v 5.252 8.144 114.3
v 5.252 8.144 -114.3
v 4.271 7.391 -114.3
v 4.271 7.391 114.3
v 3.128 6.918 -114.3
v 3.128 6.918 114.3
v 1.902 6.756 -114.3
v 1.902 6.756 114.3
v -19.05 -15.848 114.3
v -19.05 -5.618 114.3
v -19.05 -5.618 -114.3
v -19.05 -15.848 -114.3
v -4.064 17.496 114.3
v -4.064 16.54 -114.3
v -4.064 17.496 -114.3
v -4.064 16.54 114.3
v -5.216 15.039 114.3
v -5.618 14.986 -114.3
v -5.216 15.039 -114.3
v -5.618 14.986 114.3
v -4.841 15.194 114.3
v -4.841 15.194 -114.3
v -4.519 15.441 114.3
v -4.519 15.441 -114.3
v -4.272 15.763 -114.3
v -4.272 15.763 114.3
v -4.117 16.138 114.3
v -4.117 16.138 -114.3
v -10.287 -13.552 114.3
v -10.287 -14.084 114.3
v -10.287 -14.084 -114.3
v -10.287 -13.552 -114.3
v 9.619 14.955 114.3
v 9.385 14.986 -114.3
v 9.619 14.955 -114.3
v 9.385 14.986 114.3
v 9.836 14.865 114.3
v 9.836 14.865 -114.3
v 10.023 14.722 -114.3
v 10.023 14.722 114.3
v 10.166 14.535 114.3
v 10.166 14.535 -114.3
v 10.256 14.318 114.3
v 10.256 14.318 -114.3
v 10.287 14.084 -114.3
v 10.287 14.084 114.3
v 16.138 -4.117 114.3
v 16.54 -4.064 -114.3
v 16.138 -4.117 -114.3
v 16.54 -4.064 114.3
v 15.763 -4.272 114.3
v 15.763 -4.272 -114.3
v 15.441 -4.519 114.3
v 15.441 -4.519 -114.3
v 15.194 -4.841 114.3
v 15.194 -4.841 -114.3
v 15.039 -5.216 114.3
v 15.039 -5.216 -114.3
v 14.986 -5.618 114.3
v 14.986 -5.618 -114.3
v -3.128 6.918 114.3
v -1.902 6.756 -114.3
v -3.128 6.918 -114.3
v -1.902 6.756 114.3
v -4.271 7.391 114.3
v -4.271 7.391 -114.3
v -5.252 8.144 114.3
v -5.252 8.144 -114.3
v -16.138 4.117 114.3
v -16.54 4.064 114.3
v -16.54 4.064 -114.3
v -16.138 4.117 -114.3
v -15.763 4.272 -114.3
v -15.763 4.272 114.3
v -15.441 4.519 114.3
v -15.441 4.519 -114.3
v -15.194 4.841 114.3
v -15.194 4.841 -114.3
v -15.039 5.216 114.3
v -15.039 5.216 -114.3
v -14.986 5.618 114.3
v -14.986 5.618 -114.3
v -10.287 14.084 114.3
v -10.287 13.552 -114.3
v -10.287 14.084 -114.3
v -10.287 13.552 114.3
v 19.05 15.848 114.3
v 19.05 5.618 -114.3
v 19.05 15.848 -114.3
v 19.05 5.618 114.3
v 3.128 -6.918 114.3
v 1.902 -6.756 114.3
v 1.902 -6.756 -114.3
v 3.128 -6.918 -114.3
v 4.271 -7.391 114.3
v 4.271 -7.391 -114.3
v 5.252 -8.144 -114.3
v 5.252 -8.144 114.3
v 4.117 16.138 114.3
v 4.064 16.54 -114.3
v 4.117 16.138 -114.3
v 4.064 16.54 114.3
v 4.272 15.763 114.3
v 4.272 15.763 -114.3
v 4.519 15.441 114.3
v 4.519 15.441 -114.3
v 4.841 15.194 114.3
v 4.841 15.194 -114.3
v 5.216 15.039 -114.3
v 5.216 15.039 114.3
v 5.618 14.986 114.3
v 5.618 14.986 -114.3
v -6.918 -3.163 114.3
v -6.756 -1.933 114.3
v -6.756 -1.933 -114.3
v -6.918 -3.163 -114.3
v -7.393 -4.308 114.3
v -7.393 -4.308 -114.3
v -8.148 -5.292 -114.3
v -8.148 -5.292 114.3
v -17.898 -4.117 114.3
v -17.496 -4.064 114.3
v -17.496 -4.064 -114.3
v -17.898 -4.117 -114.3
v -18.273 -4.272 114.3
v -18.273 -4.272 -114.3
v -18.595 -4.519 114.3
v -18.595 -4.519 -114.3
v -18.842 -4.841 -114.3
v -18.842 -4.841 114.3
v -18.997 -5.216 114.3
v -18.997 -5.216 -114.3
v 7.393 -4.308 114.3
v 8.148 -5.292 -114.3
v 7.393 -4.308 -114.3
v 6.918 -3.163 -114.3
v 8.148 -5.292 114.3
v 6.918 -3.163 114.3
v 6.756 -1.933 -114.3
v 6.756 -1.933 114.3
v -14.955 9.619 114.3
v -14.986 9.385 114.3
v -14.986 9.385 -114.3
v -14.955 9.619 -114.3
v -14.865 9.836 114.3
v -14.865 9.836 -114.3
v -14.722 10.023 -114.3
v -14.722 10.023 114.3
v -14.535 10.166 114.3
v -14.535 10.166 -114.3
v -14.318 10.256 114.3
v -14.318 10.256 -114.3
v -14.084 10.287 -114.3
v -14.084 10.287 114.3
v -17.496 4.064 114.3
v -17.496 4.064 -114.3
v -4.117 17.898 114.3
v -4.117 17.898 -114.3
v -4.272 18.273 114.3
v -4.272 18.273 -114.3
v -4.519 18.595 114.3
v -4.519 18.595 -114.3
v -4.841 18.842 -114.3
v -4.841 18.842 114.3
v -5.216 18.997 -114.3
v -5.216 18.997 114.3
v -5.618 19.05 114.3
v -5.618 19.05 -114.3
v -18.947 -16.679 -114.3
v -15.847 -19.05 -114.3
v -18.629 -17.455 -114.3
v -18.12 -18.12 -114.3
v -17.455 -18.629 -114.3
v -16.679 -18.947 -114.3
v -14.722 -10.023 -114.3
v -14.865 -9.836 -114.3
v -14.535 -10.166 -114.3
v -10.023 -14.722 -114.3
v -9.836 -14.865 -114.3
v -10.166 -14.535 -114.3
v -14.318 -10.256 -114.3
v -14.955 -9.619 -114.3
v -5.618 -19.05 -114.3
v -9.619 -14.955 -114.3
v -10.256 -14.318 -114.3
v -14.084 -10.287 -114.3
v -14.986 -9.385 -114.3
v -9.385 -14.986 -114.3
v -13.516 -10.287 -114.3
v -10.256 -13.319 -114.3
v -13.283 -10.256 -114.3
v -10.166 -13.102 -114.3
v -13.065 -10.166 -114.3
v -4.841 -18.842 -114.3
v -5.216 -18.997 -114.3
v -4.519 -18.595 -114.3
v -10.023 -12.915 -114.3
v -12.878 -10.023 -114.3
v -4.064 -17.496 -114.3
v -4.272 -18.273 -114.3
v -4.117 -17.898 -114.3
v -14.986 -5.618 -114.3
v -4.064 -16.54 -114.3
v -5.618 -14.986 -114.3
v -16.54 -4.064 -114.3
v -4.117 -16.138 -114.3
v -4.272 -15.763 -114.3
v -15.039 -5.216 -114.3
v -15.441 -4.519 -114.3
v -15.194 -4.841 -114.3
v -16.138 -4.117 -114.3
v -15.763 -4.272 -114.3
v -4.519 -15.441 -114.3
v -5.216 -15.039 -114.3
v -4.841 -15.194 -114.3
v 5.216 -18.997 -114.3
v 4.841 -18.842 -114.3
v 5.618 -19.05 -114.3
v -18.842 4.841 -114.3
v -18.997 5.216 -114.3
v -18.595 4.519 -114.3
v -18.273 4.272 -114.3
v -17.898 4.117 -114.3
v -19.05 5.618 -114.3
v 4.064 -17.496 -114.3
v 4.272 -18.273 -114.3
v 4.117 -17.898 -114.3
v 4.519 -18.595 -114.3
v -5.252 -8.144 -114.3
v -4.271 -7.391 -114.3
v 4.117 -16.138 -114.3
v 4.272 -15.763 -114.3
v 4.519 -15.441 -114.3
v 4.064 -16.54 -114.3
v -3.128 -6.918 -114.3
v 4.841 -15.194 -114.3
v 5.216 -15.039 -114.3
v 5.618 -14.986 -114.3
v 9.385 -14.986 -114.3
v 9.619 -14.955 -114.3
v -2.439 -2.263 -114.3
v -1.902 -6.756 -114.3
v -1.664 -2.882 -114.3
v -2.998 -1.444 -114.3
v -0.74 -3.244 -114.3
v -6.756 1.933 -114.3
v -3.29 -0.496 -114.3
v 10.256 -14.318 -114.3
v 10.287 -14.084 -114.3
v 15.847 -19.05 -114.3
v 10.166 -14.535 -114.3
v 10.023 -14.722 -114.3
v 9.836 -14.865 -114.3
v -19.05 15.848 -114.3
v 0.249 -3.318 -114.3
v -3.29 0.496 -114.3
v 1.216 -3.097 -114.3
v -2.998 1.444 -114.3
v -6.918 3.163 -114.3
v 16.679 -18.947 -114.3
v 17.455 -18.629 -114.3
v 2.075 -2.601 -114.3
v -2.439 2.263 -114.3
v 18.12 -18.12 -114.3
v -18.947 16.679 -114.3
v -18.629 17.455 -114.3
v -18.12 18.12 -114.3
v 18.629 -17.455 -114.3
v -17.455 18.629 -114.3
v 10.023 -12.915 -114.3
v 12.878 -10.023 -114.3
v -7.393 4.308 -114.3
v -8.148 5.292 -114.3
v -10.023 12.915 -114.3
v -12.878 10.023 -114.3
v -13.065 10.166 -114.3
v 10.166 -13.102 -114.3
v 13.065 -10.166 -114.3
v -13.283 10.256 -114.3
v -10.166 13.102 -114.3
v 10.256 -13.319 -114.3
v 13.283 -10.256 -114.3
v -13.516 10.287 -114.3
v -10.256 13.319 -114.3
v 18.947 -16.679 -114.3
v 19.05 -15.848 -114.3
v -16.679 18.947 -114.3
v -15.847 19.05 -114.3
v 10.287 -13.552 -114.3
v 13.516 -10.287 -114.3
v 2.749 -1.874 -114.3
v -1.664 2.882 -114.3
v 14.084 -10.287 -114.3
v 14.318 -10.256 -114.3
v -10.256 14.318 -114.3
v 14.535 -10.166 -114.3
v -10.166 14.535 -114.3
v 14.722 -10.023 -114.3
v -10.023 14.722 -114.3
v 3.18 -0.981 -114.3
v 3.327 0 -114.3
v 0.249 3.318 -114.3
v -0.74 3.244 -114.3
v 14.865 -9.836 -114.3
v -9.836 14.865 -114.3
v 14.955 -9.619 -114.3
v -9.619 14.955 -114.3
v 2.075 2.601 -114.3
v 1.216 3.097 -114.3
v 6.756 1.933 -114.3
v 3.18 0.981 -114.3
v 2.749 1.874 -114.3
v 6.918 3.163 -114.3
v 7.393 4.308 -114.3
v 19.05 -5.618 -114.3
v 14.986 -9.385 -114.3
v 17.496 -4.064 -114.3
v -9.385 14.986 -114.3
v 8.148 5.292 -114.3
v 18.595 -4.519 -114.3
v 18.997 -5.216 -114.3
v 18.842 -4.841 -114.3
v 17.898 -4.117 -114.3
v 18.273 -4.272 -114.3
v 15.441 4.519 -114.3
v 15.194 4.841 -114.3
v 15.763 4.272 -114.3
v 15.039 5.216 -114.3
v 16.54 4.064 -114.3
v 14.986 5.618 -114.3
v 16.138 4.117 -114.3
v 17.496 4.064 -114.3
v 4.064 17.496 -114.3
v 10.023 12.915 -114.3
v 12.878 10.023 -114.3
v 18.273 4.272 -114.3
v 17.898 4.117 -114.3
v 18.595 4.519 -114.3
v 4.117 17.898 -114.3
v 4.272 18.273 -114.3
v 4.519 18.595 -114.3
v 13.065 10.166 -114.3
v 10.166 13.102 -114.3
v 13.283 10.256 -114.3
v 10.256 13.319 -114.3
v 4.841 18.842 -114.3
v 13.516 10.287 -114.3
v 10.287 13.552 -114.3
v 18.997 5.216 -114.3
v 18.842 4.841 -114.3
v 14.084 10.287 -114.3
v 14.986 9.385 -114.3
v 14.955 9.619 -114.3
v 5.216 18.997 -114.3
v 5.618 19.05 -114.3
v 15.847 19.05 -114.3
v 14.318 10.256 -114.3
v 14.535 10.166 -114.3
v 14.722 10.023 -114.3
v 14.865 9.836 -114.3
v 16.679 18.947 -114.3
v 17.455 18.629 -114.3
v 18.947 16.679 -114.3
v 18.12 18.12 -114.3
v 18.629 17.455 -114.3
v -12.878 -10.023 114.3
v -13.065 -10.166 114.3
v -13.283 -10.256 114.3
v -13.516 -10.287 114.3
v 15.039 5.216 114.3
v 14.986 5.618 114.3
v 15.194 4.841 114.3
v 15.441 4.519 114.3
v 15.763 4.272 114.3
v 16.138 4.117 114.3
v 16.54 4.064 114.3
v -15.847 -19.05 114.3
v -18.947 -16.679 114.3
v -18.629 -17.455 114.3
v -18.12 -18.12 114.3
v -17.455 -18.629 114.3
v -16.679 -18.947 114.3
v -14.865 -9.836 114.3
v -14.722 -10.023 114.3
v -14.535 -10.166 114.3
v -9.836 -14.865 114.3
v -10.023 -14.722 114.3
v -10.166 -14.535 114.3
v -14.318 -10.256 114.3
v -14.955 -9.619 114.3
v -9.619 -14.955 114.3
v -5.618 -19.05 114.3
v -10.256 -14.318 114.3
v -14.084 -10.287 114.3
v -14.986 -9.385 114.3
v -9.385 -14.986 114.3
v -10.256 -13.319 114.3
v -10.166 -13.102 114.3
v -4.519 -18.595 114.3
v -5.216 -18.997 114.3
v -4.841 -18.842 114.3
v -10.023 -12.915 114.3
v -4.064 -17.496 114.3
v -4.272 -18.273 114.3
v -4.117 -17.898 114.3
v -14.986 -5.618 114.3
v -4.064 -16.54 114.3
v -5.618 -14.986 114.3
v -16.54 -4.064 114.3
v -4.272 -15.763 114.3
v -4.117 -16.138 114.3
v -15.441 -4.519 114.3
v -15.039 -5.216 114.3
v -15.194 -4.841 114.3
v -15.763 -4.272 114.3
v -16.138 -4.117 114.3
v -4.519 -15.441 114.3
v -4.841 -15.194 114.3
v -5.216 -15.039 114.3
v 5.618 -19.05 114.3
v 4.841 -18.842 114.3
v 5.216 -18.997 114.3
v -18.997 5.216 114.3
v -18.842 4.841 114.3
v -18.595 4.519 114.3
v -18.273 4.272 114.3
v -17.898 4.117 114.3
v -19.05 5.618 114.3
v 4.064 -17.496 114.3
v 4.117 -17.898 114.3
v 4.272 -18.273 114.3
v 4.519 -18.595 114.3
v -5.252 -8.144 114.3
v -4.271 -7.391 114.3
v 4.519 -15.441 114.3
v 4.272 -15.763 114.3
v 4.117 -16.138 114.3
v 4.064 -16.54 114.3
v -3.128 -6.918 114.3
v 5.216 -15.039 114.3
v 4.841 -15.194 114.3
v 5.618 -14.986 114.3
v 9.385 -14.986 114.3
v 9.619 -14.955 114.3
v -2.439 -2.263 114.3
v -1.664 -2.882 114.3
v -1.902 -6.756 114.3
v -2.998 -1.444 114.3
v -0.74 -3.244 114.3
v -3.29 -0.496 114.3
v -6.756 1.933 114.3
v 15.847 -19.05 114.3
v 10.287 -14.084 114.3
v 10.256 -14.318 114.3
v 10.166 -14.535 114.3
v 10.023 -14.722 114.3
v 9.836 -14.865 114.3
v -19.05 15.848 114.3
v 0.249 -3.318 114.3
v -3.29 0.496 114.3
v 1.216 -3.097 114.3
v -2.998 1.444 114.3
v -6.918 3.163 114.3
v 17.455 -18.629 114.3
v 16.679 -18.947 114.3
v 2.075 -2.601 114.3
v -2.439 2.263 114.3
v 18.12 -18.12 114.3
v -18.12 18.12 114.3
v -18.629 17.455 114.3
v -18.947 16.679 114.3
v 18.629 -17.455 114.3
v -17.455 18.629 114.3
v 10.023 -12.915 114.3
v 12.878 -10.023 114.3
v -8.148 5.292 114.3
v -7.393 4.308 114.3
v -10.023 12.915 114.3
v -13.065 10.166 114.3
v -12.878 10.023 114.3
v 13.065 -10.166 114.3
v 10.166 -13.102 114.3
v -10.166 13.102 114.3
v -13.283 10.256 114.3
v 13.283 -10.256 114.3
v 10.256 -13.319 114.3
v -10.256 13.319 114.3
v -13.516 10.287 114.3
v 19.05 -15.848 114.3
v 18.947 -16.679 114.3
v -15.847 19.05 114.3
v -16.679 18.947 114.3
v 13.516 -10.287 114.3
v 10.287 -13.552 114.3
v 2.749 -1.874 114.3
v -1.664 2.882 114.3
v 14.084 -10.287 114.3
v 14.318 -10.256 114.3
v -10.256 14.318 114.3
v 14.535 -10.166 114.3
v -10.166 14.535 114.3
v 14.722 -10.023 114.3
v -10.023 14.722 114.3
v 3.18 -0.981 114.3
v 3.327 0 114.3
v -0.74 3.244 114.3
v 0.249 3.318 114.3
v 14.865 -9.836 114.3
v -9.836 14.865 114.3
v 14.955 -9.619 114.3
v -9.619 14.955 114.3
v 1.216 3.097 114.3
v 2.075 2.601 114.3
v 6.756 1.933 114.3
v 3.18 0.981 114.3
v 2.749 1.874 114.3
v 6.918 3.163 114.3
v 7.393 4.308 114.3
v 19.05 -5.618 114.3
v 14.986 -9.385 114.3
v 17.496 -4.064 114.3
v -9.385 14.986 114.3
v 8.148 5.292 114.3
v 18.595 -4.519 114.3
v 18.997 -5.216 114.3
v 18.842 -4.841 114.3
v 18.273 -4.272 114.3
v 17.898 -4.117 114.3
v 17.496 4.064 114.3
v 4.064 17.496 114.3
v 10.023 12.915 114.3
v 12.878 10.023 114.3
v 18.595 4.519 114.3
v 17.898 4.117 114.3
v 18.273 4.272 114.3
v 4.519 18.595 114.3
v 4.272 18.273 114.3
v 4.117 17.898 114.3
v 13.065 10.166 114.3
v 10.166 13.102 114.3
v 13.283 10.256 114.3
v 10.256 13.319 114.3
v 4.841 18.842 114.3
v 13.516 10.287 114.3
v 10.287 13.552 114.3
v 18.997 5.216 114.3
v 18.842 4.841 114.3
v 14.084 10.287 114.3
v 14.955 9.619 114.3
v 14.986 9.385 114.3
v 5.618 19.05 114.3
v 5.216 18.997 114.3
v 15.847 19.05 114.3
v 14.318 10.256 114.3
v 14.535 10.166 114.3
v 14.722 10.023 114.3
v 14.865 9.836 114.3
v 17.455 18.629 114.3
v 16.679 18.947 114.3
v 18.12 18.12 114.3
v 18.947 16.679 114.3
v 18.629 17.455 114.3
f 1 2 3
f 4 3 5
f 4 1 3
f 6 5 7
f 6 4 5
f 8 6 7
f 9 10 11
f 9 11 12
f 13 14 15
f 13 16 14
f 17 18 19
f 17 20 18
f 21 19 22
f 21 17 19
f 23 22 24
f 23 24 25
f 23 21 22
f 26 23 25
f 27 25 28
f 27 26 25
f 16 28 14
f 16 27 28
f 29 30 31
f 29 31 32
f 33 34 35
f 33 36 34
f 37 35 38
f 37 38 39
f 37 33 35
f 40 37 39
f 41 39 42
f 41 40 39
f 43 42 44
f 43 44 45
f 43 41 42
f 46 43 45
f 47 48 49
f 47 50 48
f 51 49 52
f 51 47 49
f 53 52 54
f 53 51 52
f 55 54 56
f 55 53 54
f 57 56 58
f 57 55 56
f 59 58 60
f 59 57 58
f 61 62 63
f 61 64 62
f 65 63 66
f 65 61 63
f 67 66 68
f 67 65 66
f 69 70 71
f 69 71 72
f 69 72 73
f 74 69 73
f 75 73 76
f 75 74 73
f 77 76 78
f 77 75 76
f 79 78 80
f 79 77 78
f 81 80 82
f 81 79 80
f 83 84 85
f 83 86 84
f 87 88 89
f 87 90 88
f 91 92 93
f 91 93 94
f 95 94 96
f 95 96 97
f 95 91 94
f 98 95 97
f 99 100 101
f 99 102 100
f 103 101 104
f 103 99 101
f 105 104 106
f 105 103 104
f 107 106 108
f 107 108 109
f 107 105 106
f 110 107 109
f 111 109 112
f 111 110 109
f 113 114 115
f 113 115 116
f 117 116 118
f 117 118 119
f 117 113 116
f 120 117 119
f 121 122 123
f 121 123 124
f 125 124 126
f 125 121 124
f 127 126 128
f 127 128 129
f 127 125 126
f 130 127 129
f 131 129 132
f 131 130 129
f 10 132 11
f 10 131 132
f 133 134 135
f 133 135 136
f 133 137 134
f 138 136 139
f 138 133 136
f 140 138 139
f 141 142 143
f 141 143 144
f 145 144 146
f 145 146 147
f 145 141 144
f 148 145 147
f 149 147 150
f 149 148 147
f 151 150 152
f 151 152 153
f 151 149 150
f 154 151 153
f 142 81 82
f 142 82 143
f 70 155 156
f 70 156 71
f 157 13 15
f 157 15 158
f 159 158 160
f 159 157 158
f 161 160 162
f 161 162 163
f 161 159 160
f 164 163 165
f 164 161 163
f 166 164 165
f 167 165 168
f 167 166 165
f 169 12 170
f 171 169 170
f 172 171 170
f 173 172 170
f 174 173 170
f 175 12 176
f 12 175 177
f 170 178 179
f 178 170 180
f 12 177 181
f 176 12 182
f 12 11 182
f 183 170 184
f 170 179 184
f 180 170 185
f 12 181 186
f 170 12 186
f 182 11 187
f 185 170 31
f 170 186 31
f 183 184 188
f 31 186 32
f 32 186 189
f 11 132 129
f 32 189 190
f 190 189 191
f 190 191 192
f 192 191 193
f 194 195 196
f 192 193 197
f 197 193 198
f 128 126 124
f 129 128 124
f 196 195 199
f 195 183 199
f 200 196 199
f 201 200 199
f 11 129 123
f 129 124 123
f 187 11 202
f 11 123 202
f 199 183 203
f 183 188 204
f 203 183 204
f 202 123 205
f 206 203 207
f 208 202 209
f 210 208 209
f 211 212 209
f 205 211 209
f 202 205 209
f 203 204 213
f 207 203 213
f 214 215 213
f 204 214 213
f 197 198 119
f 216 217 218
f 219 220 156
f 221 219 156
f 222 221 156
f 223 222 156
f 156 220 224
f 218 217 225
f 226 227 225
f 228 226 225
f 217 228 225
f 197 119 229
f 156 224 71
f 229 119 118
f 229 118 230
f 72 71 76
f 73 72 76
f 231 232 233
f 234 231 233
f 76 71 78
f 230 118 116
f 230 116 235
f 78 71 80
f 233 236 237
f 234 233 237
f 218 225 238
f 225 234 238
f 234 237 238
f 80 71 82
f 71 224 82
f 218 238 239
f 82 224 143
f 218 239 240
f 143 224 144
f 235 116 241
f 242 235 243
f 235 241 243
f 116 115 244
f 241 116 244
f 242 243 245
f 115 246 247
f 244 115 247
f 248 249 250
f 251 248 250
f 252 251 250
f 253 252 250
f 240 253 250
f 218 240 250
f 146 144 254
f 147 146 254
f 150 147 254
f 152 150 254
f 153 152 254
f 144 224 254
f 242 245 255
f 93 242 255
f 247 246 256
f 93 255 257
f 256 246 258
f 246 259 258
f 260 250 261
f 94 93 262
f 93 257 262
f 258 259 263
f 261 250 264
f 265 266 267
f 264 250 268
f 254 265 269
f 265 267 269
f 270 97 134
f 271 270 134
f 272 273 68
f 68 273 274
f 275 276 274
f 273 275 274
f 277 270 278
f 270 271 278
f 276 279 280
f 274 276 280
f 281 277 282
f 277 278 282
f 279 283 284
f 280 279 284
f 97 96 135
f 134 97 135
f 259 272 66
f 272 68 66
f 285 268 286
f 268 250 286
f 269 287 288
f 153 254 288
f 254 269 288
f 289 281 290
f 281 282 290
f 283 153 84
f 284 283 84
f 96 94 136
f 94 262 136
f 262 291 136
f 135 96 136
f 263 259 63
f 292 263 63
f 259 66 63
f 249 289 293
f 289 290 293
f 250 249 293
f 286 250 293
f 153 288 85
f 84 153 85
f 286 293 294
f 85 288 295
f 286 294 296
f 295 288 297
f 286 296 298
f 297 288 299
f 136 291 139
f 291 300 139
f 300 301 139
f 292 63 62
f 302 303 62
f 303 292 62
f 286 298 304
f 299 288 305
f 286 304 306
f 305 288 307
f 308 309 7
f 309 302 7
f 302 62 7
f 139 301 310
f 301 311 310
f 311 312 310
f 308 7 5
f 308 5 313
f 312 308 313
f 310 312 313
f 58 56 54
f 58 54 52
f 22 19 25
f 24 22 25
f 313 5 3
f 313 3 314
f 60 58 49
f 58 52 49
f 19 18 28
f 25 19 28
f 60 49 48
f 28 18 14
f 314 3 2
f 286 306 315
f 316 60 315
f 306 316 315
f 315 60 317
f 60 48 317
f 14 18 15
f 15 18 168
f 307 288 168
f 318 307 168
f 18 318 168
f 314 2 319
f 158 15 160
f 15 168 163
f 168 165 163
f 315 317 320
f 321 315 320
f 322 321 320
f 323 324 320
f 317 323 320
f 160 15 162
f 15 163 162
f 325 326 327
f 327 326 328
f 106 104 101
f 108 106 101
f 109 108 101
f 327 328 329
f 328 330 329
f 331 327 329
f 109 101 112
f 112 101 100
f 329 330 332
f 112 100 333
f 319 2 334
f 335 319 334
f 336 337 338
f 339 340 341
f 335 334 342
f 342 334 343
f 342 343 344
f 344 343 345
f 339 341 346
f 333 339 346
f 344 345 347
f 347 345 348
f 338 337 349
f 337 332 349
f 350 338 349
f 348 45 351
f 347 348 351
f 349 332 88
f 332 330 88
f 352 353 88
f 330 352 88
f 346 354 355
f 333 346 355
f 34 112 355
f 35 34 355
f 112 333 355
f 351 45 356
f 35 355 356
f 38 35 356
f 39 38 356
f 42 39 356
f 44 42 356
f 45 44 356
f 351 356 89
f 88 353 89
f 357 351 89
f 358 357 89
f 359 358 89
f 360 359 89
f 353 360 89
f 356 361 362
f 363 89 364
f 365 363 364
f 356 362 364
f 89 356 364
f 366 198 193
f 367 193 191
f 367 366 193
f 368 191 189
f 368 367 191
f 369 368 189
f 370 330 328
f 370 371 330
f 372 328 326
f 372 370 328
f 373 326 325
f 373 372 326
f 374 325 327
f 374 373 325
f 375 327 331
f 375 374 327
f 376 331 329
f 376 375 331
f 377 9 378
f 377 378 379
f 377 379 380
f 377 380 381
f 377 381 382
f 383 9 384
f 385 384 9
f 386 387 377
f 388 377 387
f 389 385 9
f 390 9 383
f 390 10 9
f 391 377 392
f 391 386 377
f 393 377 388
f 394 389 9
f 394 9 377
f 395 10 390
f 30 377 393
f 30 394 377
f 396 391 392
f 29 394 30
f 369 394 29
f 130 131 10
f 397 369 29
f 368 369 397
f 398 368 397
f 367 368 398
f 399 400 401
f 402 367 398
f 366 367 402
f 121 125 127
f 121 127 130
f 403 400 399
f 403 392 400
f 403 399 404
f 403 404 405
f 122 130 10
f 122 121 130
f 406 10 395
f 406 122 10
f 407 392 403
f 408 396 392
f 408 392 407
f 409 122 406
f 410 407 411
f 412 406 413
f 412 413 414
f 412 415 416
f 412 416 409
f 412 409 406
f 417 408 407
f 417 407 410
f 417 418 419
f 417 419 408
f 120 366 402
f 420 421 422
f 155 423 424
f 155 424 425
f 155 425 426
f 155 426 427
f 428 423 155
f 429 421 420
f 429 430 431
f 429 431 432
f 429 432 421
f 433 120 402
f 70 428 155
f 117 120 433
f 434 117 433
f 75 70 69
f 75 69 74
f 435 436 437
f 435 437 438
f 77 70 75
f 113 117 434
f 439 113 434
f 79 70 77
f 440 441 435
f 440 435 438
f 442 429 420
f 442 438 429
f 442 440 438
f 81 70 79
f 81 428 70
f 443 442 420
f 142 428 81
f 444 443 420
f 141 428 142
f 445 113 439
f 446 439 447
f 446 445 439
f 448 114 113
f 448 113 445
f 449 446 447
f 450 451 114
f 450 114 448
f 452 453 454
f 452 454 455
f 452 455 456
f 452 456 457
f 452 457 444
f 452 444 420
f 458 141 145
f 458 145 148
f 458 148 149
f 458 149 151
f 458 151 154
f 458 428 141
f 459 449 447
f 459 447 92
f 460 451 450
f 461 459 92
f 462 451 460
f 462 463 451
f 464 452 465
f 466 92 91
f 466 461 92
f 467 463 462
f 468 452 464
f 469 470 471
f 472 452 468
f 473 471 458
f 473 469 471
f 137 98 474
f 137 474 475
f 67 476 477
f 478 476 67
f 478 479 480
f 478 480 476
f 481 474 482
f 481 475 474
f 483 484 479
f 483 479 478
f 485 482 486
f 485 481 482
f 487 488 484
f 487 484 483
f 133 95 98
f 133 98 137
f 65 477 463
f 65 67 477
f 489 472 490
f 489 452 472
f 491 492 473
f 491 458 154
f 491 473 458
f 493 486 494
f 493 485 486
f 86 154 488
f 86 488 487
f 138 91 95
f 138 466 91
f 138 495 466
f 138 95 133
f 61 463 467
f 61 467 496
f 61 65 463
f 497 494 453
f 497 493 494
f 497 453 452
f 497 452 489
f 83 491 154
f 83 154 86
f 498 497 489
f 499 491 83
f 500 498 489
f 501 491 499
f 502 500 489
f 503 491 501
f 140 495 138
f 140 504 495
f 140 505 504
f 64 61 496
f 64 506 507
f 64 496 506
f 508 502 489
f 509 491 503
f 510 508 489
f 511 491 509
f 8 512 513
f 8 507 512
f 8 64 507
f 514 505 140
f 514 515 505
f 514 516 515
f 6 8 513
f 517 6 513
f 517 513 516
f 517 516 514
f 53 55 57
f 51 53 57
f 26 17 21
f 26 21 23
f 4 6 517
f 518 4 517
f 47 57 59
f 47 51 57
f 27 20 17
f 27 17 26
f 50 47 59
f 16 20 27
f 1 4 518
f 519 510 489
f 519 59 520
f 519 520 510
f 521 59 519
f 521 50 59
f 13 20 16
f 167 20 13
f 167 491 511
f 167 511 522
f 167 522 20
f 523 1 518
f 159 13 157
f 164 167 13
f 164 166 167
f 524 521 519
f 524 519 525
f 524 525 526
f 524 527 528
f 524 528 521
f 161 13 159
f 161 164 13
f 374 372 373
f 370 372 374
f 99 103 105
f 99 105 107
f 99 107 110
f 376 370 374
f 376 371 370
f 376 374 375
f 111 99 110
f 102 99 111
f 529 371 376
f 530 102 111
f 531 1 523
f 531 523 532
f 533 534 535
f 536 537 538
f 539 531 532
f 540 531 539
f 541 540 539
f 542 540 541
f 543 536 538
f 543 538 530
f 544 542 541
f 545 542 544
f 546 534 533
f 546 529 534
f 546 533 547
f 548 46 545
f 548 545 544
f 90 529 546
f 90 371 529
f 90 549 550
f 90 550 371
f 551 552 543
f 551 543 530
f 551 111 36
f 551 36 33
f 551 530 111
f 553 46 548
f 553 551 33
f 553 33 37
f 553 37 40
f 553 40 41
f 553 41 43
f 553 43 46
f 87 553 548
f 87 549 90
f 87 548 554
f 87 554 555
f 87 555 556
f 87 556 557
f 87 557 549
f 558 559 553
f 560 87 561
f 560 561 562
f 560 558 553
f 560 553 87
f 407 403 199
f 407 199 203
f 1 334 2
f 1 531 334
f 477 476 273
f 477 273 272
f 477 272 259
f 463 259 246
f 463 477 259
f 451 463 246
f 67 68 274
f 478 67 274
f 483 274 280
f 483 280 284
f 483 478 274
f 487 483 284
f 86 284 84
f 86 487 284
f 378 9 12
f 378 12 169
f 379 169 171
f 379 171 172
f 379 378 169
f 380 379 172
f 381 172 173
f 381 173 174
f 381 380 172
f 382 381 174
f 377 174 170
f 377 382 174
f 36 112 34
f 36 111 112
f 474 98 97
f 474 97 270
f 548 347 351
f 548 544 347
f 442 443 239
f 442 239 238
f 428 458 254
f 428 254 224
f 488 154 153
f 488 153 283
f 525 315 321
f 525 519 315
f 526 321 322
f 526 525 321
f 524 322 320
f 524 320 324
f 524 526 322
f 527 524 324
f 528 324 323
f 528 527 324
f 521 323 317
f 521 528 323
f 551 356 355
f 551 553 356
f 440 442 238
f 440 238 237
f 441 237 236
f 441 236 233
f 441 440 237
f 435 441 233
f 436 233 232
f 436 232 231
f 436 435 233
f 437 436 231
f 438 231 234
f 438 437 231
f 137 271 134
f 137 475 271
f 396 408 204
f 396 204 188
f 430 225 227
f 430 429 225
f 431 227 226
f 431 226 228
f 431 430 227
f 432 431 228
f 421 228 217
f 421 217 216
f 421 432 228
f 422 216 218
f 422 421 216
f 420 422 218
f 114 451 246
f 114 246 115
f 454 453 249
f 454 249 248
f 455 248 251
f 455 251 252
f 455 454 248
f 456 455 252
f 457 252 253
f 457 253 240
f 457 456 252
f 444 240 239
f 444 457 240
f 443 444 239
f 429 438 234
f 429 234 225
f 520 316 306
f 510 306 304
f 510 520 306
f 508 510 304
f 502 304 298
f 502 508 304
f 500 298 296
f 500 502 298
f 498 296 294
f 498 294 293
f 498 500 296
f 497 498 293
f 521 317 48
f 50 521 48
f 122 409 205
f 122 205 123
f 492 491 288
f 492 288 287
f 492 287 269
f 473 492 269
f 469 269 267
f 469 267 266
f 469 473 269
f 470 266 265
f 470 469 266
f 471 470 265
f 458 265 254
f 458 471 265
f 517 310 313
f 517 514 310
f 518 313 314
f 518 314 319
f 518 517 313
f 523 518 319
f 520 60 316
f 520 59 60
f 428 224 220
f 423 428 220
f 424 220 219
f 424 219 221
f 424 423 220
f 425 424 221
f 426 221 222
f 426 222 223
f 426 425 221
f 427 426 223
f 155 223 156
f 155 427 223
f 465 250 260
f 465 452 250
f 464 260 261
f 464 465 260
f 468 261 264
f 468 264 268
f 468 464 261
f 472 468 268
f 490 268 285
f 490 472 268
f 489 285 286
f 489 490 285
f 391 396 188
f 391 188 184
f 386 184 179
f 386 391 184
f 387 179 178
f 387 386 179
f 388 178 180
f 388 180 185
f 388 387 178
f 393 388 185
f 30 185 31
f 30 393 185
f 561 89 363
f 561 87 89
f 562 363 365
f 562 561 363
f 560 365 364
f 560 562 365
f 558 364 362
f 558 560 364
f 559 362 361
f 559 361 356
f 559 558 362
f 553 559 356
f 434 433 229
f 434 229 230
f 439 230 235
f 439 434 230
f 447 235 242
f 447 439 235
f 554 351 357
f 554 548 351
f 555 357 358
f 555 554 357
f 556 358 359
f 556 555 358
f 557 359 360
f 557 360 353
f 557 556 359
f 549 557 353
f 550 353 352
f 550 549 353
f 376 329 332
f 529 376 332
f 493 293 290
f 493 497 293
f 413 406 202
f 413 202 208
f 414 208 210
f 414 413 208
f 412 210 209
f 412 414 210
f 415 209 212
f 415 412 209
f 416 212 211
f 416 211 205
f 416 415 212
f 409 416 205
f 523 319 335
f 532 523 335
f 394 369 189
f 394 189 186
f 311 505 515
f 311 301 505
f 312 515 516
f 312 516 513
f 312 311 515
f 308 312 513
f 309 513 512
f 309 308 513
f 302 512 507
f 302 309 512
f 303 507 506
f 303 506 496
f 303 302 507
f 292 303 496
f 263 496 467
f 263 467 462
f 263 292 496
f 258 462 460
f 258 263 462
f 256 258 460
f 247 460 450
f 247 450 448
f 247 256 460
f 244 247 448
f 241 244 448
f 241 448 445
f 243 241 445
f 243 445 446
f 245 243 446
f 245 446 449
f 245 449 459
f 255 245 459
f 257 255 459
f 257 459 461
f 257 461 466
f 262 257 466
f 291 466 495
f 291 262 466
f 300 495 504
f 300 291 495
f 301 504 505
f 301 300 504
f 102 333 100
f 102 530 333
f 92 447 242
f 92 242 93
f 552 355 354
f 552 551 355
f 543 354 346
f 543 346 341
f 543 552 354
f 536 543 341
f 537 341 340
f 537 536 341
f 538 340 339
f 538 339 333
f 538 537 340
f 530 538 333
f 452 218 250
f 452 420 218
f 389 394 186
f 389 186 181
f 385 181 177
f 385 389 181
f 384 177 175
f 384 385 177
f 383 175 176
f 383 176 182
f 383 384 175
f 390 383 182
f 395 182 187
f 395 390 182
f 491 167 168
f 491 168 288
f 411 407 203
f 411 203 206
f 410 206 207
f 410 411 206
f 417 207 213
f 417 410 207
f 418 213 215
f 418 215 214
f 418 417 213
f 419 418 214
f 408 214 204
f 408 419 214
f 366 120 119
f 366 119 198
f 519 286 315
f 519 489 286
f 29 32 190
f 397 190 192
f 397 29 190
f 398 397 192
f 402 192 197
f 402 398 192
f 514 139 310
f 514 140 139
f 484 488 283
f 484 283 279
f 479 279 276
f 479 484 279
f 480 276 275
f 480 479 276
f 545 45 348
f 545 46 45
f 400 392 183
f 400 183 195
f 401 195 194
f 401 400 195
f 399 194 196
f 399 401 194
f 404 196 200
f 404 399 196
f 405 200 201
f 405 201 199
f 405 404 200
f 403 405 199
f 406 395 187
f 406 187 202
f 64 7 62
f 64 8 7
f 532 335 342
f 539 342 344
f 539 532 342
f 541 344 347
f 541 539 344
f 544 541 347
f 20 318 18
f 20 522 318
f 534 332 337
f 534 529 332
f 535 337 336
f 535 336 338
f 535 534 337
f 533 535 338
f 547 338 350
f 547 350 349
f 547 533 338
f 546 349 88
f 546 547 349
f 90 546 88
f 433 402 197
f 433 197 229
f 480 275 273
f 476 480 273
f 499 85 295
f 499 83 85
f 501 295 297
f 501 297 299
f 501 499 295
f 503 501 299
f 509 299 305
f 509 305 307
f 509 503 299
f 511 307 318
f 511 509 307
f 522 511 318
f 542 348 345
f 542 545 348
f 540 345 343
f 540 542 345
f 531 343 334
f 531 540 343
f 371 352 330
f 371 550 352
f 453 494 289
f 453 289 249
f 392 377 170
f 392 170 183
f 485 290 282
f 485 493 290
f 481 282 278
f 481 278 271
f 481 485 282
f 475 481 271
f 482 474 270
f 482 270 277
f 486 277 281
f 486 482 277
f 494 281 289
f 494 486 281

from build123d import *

# Parameters (mm, degrees)
SKETCH1_R           = 3.3274
BOSS_EXTRUDE1_DEPTH = 114.3


with BuildPart() as part:
    # Sketch1 → Boss-Extrude1 (new body, symmetric)
    with BuildSketch(Plane.XY):
        with BuildLine():
            Line((-4.064, 16.539617552), (-4.064, 17.496382454))
            ThreePointArc((-4.064, 17.496382454), (-4.519044044, 18.594955958), (-5.617617547, 19.050000004))
            Line((-5.617617547, 19.050000004), (-15.84748704, 19.050000004))
            ThreePointArc((-15.84748704, 19.050000004), (-18.12017629, 18.120192086), (-19.050000001, 15.847509297))
            Line((-19.050000001, 15.847509297), (-19.050000001, 5.617617549))
            ThreePointArc((-19.050000001, 5.617617549), (-18.594955957, 4.519044045), (-17.496382454, 4.064))
            Line((-17.496382454, 4.064), (-16.539617549, 4.064))
            ThreePointArc((-16.539617549, 4.064), (-15.441044044, 4.519044045), (-14.986, 5.617617549))
            Line((-14.986, 5.617617549), (-14.986, 9.385342517))
            ThreePointArc((-14.986, 9.385342517), (-14.721898184, 10.022940701), (-14.0843, 10.287042517))
            Line((-14.0843, 10.287042517), (-13.516042086, 10.287042517))
            ThreePointArc((-13.516042086, 10.287042517), (-13.170975923, 10.218404479), (-12.878443117, 10.022939917))
            Line((-12.878443117, 10.022939917), (-8.14758008, 5.292065242))
            ThreePointArc((-8.14758008, 5.292065242), (-7.117955877, 3.751120652), (-6.756399998, 1.933453582))
            Line((-6.756399998, 1.933453582), (-6.756399998, -1.933453584))
            ThreePointArc((-6.756399998, -1.933453584), (-7.117955877, -3.751120652), (-8.147580078, -5.292065242))
            Line((-8.147580078, -5.292065242), (-12.878443116, -10.022939917))
            ThreePointArc((-12.878443116, -10.022939917), (-13.170975922, -10.21840448), (-13.516042086, -10.287042518))
            Line((-13.516042086, -10.287042518), (-14.0843, -10.287042518))
            ThreePointArc((-14.0843, -10.287042518), (-14.721898185, -10.022940703), (-14.986, -9.385342518))
            Line((-14.986, -9.385342518), (-14.986, -5.617617549))
            ThreePointArc((-14.986, -5.617617549), (-15.441044044, -4.519044046), (-16.539617547, -4.064))
            Line((-16.539617547, -4.064), (-17.496382452, -4.064))
            ThreePointArc((-17.496382452, -4.064), (-18.594955956, -4.519044044), (-19.050000001, -5.617617547))
            Line((-19.050000001, -5.617617547), (-19.050000001, -15.84751072))
            ThreePointArc((-19.050000001, -15.84751072), (-18.120175718, -18.120192644), (-15.84748687, -19.050000001))
            Line((-15.84748687, -19.050000001), (-5.617617549, -19.050000001))
            ThreePointArc((-5.617617549, -19.050000001), (-4.519044046, -18.594955957), (-4.064, -17.496382454))
            Line((-4.064, -17.496382454), (-4.064, -16.539617549))
            ThreePointArc((-4.064, -16.539617549), (-4.519044045, -15.441044044), (-5.617617549, -14.985999999))
            Line((-5.617617549, -14.985999999), (-9.3853, -14.985999999))
            ThreePointArc((-9.3853, -14.985999999), (-10.022898185, -14.721898184), (-10.287, -14.084299999))
            Line((-10.287, -14.084299999), (-10.287, -13.552357131))
            ThreePointArc((-10.287, -13.552357131), (-10.218362387, -13.207291993), (-10.022898969, -12.914759731))
            Line((-10.022898969, -12.914759731), (-5.252158104, -8.14400713))
            ThreePointArc((-5.252158104, -8.14400713), (-3.715177371, -7.117027388), (-1.902183976, -6.7564))
            Line((-1.902183976, -6.7564), (1.902183976, -6.7564))
            ThreePointArc((1.902183976, -6.7564), (3.715177372, -7.117027388), (5.252158106, -8.144007132))
            Line((5.252158106, -8.144007132), (10.022898969, -12.91475973))
            ThreePointArc((10.022898969, -12.91475973), (10.218362387, -13.207291993), (10.287000001, -13.552357132))
            Line((10.287000001, -13.552357132), (10.287000001, -14.0843))
            ThreePointArc((10.287000001, -14.0843), (10.022898185, -14.721898184), (9.385300001, -14.986))
            Line((9.385300001, -14.986), (5.617617549, -14.986))
            ThreePointArc((5.617617549, -14.986), (4.519044045, -15.441044044), (4.064, -16.539617547))
            Line((4.064, -16.539617547), (4.064, -17.496382452))
            ThreePointArc((4.064, -17.496382452), (4.519044043, -18.594955955), (5.617617546, -19.050000001))
            Line((5.617617546, -19.050000001), (15.847486867, -19.050000001))
            ThreePointArc((15.847486867, -19.050000001), (18.120175716, -18.120192646), (19.05, -15.847510723))
            Line((19.05, -15.847510723), (19.05, -5.617617549))
            ThreePointArc((19.05, -5.617617549), (18.594955955, -4.519044045), (17.496382451, -4.064))
            Line((17.496382451, -4.064), (16.539617548, -4.064))
            ThreePointArc((16.539617548, -4.064), (15.441044044, -4.519044045), (14.985999999, -5.617617549))
            Line((14.985999999, -5.617617549), (14.985999999, -9.385342517))
            ThreePointArc((14.985999999, -9.385342517), (14.721898184, -10.022940701), (14.084299999, -10.287042517))
            Line((14.084299999, -10.287042517), (13.516042085, -10.287042517))
            ThreePointArc((13.516042085, -10.287042517), (13.170975922, -10.218404479), (12.878443117, -10.022939917))
            Line((12.878443117, -10.022939917), (8.147580079, -5.292065242))
            ThreePointArc((8.147580079, -5.292065242), (7.117955877, -3.751120652), (6.756399998, -1.933453583))
            Line((6.756399998, -1.933453583), (6.756399998, 1.933453583))
            ThreePointArc((6.756399998, 1.933453583), (7.117955877, 3.751120652), (8.147580078, 5.292065242))
            Line((8.147580078, 5.292065242), (12.878443116, 10.022939916))
            ThreePointArc((12.878443116, 10.022939916), (13.170975922, 10.218404477), (13.516042084, 10.287042515))
            Line((13.516042084, 10.287042515), (14.084299998, 10.287042515))
            ThreePointArc((14.084299998, 10.287042515), (14.721898183, 10.0229407), (14.985999998, 9.385342515))
            Line((14.985999998, 9.385342515), (14.985999998, 5.617617546))
            ThreePointArc((14.985999998, 5.617617546), (15.441044043, 4.519044042), (16.539617547, 4.063999997))
            Line((16.539617547, 4.063999997), (17.49638245, 4.063999997))
            ThreePointArc((17.49638245, 4.063999997), (18.594955956, 4.519044042), (19.05, 5.617617548))
            Line((19.05, 5.617617548), (19.05, 15.8475093))
            ThreePointArc((19.05, 15.8475093), (18.120176289, 18.120192086), (15.847487041, 19.050000004))
            Line((15.847487041, 19.050000004), (5.617617548, 19.050000004))
            ThreePointArc((5.617617548, 19.050000004), (4.519044044, 18.594955959), (4.063999999, 17.496382454))
            Line((4.063999999, 17.496382454), (4.063999999, 16.539617552))
            ThreePointArc((4.063999999, 16.539617552), (4.519044044, 15.441044047), (5.617617548, 14.986000002))
            Line((5.617617548, 14.986000002), (9.385299999, 14.986000002))
            ThreePointArc((9.385299999, 14.986000002), (10.022898183, 14.721898187), (10.286999999, 14.084300002))
            Line((10.286999999, 14.084300002), (10.286999999, 13.552357134))
            ThreePointArc((10.286999999, 13.552357134), (10.218362386, 13.207291996), (10.022898968, 12.914759734))
            Line((10.022898968, 12.914759734), (5.252158103, 8.144007133))
            ThreePointArc((5.252158103, 8.144007133), (3.71517737, 7.117027391), (1.902183975, 6.756400003))
            Line((1.902183975, 6.756400003), (-1.902183977, 6.756400003))
            ThreePointArc((-1.902183977, 6.756400003), (-3.715177373, 7.117027391), (-5.252158106, 8.144007134))
            Line((-5.252158106, 8.144007134), (-10.022898969, 12.914759733))
            ThreePointArc((-10.022898969, 12.914759733), (-10.218362387, 13.207291995), (-10.287000001, 13.552357134))
            Line((-10.287000001, 13.552357134), (-10.287000001, 14.084300002))
            ThreePointArc((-10.287000001, 14.084300002), (-10.022898186, 14.721898187), (-9.385300001, 14.986000002))
            Line((-9.385300001, 14.986000002), (-5.617617549, 14.986000002))
            ThreePointArc((-5.617617549, 14.986000002), (-4.519044044, 15.441044047), (-4.064, 16.539617552))
        make_face()
        Circle(SKETCH1_R, mode=Mode.SUBTRACT)
    extrude(amount=BOSS_EXTRUDE1_DEPTH, both=True)


solid = part.part
